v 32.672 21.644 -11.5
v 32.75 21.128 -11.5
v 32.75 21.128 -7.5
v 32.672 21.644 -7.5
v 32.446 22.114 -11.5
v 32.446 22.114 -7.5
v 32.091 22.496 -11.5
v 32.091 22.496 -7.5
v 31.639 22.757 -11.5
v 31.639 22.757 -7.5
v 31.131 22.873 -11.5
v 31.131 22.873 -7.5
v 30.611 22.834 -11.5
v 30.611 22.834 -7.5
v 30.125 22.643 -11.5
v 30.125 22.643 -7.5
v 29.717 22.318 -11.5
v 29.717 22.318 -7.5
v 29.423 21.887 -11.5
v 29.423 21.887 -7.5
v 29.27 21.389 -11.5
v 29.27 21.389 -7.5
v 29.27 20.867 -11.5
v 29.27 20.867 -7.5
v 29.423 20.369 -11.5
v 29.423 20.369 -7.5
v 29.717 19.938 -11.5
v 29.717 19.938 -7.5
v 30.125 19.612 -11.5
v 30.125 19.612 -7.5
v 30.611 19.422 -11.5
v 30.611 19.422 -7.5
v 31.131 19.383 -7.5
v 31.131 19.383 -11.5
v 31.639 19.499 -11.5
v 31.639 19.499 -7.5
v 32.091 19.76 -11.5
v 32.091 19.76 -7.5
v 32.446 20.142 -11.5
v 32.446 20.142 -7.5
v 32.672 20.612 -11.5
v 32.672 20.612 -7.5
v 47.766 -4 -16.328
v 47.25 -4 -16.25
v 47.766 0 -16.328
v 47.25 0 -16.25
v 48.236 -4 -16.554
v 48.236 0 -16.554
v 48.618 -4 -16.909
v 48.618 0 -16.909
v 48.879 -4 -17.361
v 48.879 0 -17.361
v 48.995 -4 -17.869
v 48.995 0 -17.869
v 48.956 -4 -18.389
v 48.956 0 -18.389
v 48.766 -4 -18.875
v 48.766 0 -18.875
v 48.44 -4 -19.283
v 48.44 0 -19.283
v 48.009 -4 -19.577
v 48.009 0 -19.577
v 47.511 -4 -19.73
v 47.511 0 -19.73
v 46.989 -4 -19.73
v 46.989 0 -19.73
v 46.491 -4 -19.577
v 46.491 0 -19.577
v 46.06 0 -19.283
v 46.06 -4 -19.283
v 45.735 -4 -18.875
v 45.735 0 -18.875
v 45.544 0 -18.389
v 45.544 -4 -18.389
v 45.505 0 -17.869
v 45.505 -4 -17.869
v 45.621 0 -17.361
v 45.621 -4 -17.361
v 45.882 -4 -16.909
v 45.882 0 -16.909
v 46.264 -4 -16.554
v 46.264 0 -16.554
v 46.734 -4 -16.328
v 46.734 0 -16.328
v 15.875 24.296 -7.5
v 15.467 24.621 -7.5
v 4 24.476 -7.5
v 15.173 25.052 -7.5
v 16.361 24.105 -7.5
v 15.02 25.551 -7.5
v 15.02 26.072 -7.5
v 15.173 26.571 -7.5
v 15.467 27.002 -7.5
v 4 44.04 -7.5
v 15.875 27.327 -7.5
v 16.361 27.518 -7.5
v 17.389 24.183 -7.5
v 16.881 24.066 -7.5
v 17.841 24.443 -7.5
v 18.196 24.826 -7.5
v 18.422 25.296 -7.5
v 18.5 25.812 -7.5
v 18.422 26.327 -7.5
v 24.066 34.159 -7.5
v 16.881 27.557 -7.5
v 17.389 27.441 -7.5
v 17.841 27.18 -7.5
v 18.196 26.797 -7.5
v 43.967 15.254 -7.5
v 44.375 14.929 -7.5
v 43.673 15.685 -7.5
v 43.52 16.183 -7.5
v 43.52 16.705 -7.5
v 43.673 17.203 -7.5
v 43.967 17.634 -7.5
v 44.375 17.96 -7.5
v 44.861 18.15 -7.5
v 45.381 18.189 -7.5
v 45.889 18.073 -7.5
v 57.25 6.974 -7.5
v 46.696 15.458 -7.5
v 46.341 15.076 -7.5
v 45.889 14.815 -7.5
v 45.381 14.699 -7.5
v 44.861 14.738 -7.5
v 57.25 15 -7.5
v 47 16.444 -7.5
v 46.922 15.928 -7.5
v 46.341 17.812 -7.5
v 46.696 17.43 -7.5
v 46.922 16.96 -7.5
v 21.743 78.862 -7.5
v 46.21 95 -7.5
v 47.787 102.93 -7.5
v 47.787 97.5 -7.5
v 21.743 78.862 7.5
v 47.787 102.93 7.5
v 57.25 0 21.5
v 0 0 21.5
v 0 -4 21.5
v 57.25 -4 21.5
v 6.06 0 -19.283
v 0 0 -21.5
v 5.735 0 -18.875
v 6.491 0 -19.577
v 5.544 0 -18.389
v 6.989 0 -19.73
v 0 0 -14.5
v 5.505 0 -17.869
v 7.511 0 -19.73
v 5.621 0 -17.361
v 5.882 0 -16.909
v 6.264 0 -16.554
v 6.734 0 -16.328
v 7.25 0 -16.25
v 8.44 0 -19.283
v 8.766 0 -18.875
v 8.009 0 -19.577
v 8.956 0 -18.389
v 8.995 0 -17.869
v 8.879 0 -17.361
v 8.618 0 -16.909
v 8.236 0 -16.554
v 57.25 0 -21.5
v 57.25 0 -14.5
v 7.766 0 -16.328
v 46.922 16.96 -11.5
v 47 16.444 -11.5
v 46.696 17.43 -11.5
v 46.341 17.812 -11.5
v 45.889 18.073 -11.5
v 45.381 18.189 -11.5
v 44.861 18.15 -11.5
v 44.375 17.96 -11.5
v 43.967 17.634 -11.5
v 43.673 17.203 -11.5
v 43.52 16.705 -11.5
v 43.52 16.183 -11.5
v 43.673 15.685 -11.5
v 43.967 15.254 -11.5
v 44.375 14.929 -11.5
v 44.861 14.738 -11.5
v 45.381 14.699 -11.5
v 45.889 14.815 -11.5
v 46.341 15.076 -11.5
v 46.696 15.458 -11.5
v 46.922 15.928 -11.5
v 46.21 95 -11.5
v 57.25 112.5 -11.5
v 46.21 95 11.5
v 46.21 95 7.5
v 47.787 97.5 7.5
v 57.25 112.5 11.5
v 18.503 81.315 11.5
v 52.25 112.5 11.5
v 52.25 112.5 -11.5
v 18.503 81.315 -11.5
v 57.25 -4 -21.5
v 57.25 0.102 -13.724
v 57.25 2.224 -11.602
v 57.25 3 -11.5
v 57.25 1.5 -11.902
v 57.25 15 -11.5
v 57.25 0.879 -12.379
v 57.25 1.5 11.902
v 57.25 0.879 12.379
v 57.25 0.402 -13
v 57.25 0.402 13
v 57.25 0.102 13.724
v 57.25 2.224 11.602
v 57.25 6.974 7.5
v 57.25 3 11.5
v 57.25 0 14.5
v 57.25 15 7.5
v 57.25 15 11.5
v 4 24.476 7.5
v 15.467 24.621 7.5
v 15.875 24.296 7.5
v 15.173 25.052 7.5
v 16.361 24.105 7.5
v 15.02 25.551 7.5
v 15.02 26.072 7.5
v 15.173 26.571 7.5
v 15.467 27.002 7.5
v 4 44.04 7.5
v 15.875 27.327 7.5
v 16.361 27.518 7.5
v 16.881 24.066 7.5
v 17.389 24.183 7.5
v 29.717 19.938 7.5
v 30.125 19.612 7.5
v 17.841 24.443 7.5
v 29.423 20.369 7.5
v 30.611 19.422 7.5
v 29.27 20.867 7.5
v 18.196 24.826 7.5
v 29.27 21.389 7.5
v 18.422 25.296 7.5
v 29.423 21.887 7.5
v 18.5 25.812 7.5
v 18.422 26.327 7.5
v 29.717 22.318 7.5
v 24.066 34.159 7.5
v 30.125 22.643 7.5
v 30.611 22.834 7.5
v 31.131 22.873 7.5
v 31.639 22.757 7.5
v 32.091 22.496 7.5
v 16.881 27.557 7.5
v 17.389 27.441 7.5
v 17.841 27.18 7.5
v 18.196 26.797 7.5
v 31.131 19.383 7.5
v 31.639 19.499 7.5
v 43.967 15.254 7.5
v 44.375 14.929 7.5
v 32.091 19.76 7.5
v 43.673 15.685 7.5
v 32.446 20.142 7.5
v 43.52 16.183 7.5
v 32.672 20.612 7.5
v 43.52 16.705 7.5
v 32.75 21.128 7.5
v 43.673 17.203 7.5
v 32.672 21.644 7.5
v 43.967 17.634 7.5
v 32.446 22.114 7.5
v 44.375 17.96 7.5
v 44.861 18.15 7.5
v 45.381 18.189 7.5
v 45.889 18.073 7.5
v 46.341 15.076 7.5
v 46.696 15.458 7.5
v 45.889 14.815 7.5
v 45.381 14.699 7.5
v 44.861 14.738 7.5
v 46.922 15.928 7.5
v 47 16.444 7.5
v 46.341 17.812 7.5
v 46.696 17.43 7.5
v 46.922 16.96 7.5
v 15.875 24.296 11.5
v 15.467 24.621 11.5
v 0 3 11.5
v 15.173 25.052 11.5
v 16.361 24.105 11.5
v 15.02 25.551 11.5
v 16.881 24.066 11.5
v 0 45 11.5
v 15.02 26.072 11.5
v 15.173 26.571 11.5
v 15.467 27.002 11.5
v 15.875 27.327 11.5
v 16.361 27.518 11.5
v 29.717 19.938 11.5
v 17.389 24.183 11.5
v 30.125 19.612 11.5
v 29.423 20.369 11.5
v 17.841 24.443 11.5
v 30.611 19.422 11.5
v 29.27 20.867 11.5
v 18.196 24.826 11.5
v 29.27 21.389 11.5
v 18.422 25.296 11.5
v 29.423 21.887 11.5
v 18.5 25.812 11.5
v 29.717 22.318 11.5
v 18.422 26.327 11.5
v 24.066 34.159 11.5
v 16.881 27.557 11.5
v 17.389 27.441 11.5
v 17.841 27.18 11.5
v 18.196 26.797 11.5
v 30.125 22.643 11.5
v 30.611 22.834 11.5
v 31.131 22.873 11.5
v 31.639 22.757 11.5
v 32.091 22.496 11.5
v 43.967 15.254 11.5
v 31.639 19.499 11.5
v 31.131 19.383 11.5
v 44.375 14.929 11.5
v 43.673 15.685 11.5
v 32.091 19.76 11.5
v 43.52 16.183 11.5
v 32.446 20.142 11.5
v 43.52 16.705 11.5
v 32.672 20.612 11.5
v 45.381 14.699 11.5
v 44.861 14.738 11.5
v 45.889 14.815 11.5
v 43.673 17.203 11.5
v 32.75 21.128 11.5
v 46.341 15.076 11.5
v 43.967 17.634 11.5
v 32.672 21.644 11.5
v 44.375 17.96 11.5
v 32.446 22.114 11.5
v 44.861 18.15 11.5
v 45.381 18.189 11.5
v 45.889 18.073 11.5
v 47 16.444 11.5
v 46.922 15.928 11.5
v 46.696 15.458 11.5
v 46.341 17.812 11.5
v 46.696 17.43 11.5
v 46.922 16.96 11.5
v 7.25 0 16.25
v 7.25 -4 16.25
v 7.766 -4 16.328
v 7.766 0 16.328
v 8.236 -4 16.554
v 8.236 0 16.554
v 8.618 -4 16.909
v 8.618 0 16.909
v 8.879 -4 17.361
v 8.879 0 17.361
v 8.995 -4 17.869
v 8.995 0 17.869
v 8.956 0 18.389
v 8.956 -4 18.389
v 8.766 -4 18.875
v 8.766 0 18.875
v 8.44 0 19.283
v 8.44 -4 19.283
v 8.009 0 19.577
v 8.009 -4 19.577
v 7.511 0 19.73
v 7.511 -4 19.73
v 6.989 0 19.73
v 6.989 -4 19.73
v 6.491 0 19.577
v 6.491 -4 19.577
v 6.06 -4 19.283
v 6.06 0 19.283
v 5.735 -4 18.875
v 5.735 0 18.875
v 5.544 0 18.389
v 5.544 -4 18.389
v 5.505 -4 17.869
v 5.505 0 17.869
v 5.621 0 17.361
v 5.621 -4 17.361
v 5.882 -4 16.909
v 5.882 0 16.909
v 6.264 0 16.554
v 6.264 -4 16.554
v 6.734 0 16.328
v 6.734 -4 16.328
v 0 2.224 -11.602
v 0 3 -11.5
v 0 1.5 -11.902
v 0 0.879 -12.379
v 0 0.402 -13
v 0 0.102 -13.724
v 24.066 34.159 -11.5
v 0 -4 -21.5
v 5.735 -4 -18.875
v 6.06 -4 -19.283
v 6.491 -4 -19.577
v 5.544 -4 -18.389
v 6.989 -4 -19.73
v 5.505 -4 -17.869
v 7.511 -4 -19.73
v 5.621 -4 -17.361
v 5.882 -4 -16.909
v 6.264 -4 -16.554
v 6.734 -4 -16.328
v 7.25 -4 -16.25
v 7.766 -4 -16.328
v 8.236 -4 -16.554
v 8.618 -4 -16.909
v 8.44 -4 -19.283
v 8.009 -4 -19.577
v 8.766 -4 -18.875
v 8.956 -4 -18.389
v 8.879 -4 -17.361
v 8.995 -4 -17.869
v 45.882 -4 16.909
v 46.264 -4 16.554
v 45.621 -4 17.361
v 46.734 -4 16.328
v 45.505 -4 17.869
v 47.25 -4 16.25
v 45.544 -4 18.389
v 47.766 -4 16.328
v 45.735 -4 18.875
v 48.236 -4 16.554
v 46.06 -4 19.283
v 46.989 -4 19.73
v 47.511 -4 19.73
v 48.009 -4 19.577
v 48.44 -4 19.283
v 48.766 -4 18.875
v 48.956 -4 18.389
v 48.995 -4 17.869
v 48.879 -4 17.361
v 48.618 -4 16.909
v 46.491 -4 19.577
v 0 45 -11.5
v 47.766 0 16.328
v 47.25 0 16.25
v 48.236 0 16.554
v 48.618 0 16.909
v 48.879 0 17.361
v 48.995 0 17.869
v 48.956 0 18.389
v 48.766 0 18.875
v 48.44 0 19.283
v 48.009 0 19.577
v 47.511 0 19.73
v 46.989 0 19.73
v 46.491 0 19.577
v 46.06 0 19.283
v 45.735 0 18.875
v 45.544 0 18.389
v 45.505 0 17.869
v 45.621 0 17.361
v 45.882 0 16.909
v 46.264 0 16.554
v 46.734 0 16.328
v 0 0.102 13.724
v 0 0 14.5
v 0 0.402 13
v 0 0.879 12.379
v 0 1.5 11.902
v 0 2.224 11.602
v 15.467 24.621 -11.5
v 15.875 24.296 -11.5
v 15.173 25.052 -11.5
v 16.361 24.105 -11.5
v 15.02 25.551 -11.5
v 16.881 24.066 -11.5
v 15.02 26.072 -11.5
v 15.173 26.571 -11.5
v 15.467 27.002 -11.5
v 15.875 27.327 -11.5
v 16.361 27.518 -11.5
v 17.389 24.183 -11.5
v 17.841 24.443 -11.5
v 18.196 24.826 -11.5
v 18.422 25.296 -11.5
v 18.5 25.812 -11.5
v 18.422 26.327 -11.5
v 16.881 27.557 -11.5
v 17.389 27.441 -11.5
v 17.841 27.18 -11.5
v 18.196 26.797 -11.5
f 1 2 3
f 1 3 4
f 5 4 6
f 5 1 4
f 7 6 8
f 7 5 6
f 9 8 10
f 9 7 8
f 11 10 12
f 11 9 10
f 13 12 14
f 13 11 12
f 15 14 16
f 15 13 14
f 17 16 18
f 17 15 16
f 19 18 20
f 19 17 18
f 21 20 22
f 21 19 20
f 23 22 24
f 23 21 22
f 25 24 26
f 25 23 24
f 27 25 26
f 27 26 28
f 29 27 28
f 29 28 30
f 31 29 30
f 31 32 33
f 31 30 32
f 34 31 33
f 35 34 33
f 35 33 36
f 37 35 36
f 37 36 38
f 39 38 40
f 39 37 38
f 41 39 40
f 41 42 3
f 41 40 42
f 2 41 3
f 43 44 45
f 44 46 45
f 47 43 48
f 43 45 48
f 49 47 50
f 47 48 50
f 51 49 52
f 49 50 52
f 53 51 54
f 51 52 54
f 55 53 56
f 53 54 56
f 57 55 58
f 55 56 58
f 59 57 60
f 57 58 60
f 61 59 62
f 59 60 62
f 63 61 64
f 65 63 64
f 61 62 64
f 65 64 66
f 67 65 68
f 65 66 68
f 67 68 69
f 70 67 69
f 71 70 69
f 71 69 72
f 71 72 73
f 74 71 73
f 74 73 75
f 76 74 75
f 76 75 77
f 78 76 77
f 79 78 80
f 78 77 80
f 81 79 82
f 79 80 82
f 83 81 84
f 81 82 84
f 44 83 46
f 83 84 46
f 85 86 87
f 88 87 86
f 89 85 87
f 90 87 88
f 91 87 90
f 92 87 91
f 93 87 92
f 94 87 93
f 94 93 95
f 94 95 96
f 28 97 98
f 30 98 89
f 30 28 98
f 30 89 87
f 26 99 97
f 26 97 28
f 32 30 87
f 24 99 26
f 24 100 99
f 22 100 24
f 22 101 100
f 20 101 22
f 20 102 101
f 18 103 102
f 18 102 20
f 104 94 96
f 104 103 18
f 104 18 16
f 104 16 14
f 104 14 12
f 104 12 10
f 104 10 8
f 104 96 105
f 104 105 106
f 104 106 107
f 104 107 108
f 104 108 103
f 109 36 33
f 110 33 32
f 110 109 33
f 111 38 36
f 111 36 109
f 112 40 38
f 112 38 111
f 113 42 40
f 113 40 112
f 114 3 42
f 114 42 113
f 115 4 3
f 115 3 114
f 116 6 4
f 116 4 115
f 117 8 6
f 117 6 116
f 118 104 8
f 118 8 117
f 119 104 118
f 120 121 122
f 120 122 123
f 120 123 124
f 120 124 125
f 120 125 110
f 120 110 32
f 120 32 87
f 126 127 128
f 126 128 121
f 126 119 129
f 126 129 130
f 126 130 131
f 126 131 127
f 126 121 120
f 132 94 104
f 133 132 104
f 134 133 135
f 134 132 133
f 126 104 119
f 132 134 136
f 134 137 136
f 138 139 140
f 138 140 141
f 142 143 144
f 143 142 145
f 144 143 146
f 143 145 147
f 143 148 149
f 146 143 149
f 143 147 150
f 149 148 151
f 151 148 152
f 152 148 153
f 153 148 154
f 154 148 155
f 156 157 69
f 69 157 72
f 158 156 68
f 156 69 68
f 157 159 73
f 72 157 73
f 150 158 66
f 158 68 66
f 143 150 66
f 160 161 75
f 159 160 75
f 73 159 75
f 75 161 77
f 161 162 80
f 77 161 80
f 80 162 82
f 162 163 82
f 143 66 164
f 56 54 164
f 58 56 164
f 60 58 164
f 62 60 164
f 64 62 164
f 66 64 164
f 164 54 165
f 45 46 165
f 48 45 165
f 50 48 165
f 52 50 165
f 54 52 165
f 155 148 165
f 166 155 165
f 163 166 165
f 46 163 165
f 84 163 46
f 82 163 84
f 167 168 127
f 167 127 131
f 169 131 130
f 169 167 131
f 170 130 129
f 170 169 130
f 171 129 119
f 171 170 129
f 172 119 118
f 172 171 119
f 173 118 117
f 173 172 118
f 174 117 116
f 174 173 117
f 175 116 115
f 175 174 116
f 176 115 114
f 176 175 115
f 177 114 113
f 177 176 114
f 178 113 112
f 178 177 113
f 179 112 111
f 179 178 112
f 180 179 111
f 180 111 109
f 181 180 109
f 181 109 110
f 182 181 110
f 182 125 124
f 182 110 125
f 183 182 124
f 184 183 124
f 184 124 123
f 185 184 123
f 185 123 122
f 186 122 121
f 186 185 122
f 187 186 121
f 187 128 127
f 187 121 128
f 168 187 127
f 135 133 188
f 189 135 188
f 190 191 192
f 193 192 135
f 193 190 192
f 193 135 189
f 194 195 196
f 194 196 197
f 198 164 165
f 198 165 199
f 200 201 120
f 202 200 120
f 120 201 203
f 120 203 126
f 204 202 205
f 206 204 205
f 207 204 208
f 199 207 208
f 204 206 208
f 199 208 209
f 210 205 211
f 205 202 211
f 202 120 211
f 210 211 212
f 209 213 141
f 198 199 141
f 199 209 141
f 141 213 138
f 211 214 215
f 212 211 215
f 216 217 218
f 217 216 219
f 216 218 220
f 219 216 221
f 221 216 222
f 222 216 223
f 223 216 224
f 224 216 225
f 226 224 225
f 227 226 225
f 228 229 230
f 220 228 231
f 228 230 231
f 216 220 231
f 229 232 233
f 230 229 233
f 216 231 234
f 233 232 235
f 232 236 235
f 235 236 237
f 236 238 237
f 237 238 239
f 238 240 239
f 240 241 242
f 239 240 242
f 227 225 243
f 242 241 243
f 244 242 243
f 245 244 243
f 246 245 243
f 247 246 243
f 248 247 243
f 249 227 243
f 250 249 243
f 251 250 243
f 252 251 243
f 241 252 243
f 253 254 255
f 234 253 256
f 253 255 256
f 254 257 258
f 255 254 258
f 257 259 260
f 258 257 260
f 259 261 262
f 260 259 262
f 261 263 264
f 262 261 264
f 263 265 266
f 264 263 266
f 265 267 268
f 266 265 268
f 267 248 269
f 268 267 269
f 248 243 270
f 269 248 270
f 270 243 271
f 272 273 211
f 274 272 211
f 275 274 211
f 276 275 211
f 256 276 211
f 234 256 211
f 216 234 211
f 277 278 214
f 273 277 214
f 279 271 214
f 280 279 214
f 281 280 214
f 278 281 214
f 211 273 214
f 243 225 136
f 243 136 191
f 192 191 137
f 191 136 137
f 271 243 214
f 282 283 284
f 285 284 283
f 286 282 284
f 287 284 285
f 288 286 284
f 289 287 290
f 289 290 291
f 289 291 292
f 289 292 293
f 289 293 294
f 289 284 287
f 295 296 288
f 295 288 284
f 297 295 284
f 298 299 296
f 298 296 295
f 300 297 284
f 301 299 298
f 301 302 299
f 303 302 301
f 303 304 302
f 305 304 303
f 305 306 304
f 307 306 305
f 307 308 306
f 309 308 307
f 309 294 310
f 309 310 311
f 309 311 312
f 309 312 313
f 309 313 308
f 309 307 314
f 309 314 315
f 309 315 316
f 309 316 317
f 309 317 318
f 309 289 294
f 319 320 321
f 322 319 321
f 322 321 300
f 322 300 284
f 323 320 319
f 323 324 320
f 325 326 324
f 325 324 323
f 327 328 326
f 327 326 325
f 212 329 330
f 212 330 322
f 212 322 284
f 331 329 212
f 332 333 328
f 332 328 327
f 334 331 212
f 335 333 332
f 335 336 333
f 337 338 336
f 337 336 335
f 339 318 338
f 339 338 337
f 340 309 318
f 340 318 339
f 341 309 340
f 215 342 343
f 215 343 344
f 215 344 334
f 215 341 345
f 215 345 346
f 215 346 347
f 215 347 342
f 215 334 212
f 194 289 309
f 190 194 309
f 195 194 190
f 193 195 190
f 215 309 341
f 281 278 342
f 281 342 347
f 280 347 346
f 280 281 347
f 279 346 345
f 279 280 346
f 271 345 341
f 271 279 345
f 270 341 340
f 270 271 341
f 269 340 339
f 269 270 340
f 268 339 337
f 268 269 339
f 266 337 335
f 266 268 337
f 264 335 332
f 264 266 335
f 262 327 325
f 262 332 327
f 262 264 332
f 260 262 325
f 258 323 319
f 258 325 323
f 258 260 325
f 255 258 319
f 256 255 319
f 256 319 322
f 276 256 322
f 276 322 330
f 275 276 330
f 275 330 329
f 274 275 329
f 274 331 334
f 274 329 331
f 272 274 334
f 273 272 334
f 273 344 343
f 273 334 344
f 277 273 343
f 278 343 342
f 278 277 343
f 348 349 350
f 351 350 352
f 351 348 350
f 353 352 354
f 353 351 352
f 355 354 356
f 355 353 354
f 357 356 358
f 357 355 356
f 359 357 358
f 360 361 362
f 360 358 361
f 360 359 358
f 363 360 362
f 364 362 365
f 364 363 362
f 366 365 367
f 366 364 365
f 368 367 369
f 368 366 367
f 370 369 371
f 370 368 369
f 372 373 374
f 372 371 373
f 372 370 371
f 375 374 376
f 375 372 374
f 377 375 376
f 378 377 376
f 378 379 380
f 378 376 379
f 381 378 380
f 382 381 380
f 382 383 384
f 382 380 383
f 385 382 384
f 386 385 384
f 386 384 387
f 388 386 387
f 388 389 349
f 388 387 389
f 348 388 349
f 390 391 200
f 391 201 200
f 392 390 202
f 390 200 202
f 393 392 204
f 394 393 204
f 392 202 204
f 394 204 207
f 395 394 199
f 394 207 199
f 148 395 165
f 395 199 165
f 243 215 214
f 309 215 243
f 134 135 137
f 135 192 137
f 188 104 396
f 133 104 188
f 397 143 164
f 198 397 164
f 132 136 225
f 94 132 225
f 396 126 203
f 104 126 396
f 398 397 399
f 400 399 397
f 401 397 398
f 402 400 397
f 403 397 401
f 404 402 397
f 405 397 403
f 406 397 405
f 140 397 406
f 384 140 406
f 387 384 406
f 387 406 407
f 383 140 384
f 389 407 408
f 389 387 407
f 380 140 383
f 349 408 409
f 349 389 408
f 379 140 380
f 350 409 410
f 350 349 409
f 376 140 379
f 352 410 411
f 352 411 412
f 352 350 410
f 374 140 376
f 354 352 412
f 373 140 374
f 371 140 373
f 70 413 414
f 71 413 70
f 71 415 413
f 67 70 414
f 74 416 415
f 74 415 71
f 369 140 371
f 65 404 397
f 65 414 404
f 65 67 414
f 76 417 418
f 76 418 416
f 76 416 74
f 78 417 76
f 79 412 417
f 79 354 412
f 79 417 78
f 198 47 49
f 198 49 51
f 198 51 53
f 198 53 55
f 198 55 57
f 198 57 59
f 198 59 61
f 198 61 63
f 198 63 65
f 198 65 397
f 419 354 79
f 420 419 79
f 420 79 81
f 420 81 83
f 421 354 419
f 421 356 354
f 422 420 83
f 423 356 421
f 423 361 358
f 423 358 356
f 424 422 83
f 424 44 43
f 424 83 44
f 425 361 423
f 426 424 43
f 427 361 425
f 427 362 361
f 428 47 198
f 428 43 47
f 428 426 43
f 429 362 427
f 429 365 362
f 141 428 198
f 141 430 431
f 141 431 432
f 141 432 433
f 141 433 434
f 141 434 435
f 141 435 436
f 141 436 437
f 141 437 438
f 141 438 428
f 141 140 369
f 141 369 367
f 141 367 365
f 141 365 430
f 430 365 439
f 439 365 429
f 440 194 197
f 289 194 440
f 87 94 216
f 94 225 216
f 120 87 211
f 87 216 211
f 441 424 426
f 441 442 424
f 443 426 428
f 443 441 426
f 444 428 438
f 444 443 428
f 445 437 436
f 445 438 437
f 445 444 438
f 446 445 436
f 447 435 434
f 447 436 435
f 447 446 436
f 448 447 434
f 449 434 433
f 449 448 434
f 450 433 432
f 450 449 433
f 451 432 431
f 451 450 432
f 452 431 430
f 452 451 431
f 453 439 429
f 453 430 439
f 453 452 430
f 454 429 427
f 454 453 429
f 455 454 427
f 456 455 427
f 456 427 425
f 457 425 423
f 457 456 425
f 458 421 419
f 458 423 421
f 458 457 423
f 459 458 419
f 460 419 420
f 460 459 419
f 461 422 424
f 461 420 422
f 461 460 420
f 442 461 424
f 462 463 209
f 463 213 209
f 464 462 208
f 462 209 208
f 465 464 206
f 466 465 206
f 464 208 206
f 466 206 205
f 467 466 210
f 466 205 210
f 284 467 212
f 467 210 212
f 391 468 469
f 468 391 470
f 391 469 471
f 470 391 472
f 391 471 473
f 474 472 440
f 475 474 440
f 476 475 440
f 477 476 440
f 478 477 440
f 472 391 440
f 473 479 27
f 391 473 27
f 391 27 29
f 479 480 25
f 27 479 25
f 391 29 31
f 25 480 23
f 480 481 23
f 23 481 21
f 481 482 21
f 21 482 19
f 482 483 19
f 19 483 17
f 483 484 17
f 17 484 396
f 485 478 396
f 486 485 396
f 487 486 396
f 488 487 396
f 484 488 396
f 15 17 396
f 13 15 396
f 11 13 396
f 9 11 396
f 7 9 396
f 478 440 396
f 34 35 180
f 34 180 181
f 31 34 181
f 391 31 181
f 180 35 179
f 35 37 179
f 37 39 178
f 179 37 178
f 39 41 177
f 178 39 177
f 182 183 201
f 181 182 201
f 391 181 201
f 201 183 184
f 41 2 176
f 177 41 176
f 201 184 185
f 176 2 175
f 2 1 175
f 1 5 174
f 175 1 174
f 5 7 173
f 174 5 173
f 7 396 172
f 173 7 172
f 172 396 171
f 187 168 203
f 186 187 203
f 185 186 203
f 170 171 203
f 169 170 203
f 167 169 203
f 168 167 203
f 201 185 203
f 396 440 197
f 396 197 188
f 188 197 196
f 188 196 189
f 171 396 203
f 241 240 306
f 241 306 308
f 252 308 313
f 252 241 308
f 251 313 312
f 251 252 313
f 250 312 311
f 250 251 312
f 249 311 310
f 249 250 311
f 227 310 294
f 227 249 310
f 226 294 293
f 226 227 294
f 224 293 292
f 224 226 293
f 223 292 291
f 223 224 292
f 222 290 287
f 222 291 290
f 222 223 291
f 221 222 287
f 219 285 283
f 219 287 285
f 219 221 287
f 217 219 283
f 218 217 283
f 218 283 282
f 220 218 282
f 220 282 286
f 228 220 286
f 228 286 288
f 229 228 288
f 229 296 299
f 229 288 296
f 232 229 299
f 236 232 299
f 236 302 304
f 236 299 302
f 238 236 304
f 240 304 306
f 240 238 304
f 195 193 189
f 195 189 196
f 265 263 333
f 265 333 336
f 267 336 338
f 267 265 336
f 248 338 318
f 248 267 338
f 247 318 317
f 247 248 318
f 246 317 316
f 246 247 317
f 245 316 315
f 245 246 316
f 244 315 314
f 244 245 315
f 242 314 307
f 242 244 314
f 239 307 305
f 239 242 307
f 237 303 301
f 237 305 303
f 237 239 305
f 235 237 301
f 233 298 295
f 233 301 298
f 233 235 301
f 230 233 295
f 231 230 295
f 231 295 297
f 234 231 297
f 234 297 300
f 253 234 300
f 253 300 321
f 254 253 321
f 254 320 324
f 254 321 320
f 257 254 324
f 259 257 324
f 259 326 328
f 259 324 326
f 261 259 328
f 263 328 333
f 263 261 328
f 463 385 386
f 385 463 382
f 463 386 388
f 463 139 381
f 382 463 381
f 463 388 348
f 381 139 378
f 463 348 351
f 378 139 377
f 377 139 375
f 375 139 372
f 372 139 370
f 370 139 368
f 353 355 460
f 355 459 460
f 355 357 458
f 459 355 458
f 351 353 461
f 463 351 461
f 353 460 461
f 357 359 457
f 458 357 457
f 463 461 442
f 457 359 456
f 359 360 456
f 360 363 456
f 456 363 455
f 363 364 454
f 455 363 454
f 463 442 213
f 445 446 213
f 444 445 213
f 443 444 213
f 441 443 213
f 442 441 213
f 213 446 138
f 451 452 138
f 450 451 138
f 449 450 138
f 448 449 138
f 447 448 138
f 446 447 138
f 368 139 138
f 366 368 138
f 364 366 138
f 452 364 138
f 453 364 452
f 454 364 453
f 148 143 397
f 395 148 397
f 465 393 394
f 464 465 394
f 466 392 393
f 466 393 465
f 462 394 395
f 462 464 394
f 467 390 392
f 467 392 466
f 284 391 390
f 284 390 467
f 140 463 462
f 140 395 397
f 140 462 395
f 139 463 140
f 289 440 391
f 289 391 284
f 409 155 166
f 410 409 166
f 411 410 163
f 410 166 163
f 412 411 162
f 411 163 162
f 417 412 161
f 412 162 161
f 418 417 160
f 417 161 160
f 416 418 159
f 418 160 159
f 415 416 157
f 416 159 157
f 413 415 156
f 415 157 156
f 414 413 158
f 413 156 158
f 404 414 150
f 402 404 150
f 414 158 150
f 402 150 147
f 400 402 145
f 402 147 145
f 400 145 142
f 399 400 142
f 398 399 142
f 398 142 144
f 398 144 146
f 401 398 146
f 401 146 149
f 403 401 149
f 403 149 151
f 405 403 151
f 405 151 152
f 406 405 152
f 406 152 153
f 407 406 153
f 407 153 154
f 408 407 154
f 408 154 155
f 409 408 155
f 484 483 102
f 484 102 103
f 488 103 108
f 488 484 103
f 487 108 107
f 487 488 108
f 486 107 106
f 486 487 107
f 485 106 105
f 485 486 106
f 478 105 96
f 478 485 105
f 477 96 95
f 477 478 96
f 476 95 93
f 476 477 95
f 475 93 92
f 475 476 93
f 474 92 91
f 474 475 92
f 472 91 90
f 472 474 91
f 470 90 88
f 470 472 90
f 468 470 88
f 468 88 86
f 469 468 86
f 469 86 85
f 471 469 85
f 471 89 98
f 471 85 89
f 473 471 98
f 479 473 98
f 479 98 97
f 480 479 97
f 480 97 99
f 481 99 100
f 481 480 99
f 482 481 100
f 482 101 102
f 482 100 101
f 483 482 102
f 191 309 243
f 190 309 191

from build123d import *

# Parameters (mm, degrees)
BOSS_EXTRUDE1_DEPTH     = 11.5
SKETCH2_OUTSIDE_W       = 84.912
SKETCH2_OUTSIDE_H       = 140.162
CUT_EXTRUDE2_DEPTH      = 7.5
CUT_EXTRUDE3_DEPTH      = 129.307516771
CUT_EXTRUDE3_DEPTH_BACK = 129.307516771
SKETCH4_R               = 1.75
SKETCH5_W               = 57.250055546
SKETCH5_H               = 43
BOSS_EXTRUDE2_DEPTH     = 4
SKETCH6_R               = 1.75
CUT_EXTRUDE4_DEPTH      = 129.047135306
FILLET1_R               = 3


with BuildPart() as part:
    # Sketch1 → Boss-Extrude1 (new, symmetric)
    with BuildSketch(Plane.XY):
        Polygon((0, 0), (57.250055546, 0), (57.250055546, 15), (24.066011022, 34.158817039), (46.210390637, 95), (57.250055546, 112.5), (52.250055546, 112.5), (18.50330035, 81.314771653), (0, 45), align=None)
    extrude(amount=BOSS_EXTRUDE1_DEPTH, both=True)

    # Sketch2 outside → Cut-Extrude2 (cut, symmetric)
    with BuildSketch(Plane.XY):
        with Locations((28.625, 56.25)):
            Rectangle(SKETCH2_OUTSIDE_W, SKETCH2_OUTSIDE_H)
        Polygon((21.742887775, 78.862062909), (4, 44.039684964), (4, 24.475940791), (57.250055546, 6.97368477), (57.250055546, 0), (0, 0), (0, 45), (18.50330035, 81.314771653), (52.250055546, 112.5), (57.250055546, 112.5), (47.787485624, 97.5), (47.787485624, 102.92976146), align=None, mode=Mode.SUBTRACT)
    extrude(amount=CUT_EXTRUDE2_DEPTH, both=True, mode=Mode.SUBTRACT)

    # Sketch4 → Cut-Extrude3 (cut, two sides: drawn at the far end of the back side and taken through both)
    with BuildSketch(Plane.XY.offset(11.5).offset(-CUT_EXTRUDE3_DEPTH_BACK)):
        with Locations((45.250055546, 16.444166257)):
            Circle(SKETCH4_R)
        with Locations((31.000040397, 21.127868666)):
            Circle(SKETCH4_R)
        with Locations((16.750025248, 25.811571075)):
            Circle(SKETCH4_R)
    extrude(amount=CUT_EXTRUDE3_DEPTH + CUT_EXTRUDE3_DEPTH_BACK, mode=Mode.SUBTRACT)

    # Sketch5 → Boss-Extrude2 (add)
    with BuildSketch(Plane.XZ):
        with Locations((28.625027773, 0)):
            Rectangle(SKETCH5_W, SKETCH5_H)
    extrude(amount=BOSS_EXTRUDE2_DEPTH)

    # Sketch6 → Cut-Extrude4 (cut, symmetric)
    with BuildSketch(Plane(origin=(0, 0, 0), x_dir=(1, 0, 0), z_dir=(0, 1, 0))):
        with Locations(Location((7.250055546, 18, 0), (0, 0, 270))):
            Circle(SKETCH6_R)
        with Locations(Location((47.250055546, 18, 0), (0, 0, 270))):
            Circle(SKETCH6_R)
    cut_extrude4 = extrude(amount=CUT_EXTRUDE4_DEPTH, both=True, mode=Mode.SUBTRACT)

    # Mirror5: Cut-Extrude4 across plane
    add(cut_extrude4.mirror(Plane.XY), mode=Mode.SUBTRACT)

    # Fillet1
    fillet1_edges = [part.edges().sort_by_distance(p)[0] for p in [
        (28.625027773, 0, -11.5),
        (28.625027773, 0, 11.5),
    ]]
    fillet(fillet1_edges, radius=FILLET1_R)


solid = part.part
